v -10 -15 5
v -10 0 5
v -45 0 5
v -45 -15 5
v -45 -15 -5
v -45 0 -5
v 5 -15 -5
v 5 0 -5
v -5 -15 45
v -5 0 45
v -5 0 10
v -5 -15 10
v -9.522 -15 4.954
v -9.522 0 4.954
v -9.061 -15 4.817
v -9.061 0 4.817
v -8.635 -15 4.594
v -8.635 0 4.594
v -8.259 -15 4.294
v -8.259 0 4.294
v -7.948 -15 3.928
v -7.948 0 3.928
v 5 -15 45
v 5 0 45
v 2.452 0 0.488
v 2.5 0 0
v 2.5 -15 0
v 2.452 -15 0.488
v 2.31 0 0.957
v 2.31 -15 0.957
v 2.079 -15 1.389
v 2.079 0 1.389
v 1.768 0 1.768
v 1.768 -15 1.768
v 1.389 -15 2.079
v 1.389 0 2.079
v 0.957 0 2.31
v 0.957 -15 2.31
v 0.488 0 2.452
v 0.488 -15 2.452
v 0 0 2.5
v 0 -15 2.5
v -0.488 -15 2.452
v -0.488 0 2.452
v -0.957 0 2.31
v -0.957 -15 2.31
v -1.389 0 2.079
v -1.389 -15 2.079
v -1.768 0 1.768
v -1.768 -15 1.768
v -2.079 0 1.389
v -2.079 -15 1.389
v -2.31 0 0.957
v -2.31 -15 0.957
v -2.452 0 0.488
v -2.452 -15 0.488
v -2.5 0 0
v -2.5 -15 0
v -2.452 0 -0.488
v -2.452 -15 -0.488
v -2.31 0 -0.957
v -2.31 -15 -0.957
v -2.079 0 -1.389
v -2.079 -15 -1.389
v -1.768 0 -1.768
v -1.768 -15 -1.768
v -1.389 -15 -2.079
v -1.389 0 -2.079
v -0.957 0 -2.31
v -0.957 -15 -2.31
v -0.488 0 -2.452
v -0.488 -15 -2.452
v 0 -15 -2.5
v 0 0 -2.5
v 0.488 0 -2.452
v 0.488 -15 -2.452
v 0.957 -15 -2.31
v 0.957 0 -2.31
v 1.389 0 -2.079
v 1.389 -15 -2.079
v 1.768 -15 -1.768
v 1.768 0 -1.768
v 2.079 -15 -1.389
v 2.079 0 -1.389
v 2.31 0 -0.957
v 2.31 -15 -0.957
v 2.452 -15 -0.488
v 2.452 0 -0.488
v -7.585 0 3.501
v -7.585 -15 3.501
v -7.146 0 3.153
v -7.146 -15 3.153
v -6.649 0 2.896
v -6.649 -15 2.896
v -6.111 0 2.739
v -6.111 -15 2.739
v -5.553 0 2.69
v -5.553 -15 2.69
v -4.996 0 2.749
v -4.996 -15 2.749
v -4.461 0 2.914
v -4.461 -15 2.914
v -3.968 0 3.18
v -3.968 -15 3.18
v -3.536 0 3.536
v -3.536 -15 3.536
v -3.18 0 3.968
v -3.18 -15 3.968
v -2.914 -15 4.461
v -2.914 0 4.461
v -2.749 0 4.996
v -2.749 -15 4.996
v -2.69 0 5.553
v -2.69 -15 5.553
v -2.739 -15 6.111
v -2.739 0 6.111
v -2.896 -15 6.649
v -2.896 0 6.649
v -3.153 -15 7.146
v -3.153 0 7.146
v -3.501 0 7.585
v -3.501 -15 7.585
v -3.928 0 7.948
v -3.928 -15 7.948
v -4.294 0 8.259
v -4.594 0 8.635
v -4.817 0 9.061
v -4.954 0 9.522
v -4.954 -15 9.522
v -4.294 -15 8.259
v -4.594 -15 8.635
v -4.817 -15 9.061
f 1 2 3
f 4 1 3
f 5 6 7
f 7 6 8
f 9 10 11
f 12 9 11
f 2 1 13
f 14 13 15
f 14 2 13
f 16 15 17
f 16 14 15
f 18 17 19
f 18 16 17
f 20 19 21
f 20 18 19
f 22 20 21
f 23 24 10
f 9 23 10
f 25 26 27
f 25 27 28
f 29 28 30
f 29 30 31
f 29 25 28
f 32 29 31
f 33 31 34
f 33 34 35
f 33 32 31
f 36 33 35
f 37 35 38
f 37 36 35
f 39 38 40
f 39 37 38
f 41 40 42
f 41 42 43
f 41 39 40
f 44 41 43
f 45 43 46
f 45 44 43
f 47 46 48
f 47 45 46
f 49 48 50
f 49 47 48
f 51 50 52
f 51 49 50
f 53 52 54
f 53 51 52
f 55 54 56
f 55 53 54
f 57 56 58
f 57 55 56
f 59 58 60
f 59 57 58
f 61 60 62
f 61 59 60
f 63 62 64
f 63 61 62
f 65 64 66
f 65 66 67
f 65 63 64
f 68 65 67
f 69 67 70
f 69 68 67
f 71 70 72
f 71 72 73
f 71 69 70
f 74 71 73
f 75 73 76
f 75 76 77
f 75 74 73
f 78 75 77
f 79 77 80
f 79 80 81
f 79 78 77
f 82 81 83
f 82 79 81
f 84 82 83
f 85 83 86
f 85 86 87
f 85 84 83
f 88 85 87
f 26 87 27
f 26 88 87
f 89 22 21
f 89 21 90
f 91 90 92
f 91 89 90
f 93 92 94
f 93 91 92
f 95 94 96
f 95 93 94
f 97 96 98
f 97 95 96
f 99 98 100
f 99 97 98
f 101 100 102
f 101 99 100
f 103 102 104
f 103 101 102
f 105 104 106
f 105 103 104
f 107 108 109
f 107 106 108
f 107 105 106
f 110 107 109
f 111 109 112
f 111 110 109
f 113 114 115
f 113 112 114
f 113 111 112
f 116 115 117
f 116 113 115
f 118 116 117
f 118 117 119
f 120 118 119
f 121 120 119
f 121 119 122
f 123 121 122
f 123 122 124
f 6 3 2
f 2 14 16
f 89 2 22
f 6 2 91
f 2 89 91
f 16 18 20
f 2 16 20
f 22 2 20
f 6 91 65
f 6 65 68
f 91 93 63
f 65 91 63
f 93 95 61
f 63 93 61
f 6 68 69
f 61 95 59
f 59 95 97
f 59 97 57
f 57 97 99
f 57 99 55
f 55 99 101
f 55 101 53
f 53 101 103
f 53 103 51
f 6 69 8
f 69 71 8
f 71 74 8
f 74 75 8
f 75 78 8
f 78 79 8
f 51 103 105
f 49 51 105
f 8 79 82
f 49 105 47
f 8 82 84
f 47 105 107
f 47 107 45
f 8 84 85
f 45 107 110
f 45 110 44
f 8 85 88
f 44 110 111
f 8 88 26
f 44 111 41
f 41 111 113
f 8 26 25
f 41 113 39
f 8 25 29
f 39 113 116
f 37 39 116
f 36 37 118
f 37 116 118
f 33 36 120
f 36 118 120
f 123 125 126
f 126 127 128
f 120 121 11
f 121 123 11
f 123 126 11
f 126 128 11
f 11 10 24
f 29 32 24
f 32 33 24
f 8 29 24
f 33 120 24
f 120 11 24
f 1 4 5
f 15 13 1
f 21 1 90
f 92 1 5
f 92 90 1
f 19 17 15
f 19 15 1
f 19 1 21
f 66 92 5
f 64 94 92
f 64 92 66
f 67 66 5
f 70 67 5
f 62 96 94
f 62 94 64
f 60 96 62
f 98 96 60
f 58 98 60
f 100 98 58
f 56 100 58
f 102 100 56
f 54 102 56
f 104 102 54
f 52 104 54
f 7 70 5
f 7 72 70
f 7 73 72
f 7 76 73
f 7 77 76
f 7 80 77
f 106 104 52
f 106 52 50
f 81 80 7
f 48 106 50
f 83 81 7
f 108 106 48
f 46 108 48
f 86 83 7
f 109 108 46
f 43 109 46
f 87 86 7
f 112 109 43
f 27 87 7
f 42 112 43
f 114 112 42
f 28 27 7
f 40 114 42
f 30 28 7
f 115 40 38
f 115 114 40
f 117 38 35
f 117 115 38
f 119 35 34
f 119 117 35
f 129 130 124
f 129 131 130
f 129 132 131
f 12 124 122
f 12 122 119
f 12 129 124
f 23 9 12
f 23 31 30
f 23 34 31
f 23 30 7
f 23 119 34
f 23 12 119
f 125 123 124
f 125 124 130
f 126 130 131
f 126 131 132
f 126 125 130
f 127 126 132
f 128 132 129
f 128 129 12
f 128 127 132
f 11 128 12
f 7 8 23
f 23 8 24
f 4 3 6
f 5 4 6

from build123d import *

# Parameters (mm, degrees)
F0_R     = 2.5
F1_DEPTH = 15
F2_R     = 5
F4_DEPTH = 25


with BuildPart() as f1:
    # F0 (on Front) → F1 (new body)
    with BuildSketch(Plane.XZ):
        Polygon((5, 45), (-5, 45), (-5, 5), (-45, 5), (-45, -5), (5, -5), align=None)
        Circle(F0_R, mode=Mode.SUBTRACT)
    extrude(amount=F1_DEPTH)

    # F2
    f2_edges = [f1.edges().sort_by_distance(p)[0] for p in [
        (-5, -7.5, 5),
    ]]
    fillet(f2_edges, radius=F2_R)

    # F3 (on Front) → F4 (cut)
    with BuildSketch(Plane.XZ):
        with BuildLine():
            ThreePointArc((-10, 5), (-8.842421, 4.715854), (-7.947978, 3.928008))
            ThreePointArc((-7.947978, 3.928008), (-3.535534, 3.535534), (-3.928008, 7.947978))
            ThreePointArc((-3.928008, 7.947978), (-4.715854, 8.842421), (-5, 10))
            ThreePointArc((-5, 10), (-6.464466, 6.464466), (-10, 5))
        make_face()
    extrude(amount=F4_DEPTH, mode=Mode.SUBTRACT)


solid = f1.part
